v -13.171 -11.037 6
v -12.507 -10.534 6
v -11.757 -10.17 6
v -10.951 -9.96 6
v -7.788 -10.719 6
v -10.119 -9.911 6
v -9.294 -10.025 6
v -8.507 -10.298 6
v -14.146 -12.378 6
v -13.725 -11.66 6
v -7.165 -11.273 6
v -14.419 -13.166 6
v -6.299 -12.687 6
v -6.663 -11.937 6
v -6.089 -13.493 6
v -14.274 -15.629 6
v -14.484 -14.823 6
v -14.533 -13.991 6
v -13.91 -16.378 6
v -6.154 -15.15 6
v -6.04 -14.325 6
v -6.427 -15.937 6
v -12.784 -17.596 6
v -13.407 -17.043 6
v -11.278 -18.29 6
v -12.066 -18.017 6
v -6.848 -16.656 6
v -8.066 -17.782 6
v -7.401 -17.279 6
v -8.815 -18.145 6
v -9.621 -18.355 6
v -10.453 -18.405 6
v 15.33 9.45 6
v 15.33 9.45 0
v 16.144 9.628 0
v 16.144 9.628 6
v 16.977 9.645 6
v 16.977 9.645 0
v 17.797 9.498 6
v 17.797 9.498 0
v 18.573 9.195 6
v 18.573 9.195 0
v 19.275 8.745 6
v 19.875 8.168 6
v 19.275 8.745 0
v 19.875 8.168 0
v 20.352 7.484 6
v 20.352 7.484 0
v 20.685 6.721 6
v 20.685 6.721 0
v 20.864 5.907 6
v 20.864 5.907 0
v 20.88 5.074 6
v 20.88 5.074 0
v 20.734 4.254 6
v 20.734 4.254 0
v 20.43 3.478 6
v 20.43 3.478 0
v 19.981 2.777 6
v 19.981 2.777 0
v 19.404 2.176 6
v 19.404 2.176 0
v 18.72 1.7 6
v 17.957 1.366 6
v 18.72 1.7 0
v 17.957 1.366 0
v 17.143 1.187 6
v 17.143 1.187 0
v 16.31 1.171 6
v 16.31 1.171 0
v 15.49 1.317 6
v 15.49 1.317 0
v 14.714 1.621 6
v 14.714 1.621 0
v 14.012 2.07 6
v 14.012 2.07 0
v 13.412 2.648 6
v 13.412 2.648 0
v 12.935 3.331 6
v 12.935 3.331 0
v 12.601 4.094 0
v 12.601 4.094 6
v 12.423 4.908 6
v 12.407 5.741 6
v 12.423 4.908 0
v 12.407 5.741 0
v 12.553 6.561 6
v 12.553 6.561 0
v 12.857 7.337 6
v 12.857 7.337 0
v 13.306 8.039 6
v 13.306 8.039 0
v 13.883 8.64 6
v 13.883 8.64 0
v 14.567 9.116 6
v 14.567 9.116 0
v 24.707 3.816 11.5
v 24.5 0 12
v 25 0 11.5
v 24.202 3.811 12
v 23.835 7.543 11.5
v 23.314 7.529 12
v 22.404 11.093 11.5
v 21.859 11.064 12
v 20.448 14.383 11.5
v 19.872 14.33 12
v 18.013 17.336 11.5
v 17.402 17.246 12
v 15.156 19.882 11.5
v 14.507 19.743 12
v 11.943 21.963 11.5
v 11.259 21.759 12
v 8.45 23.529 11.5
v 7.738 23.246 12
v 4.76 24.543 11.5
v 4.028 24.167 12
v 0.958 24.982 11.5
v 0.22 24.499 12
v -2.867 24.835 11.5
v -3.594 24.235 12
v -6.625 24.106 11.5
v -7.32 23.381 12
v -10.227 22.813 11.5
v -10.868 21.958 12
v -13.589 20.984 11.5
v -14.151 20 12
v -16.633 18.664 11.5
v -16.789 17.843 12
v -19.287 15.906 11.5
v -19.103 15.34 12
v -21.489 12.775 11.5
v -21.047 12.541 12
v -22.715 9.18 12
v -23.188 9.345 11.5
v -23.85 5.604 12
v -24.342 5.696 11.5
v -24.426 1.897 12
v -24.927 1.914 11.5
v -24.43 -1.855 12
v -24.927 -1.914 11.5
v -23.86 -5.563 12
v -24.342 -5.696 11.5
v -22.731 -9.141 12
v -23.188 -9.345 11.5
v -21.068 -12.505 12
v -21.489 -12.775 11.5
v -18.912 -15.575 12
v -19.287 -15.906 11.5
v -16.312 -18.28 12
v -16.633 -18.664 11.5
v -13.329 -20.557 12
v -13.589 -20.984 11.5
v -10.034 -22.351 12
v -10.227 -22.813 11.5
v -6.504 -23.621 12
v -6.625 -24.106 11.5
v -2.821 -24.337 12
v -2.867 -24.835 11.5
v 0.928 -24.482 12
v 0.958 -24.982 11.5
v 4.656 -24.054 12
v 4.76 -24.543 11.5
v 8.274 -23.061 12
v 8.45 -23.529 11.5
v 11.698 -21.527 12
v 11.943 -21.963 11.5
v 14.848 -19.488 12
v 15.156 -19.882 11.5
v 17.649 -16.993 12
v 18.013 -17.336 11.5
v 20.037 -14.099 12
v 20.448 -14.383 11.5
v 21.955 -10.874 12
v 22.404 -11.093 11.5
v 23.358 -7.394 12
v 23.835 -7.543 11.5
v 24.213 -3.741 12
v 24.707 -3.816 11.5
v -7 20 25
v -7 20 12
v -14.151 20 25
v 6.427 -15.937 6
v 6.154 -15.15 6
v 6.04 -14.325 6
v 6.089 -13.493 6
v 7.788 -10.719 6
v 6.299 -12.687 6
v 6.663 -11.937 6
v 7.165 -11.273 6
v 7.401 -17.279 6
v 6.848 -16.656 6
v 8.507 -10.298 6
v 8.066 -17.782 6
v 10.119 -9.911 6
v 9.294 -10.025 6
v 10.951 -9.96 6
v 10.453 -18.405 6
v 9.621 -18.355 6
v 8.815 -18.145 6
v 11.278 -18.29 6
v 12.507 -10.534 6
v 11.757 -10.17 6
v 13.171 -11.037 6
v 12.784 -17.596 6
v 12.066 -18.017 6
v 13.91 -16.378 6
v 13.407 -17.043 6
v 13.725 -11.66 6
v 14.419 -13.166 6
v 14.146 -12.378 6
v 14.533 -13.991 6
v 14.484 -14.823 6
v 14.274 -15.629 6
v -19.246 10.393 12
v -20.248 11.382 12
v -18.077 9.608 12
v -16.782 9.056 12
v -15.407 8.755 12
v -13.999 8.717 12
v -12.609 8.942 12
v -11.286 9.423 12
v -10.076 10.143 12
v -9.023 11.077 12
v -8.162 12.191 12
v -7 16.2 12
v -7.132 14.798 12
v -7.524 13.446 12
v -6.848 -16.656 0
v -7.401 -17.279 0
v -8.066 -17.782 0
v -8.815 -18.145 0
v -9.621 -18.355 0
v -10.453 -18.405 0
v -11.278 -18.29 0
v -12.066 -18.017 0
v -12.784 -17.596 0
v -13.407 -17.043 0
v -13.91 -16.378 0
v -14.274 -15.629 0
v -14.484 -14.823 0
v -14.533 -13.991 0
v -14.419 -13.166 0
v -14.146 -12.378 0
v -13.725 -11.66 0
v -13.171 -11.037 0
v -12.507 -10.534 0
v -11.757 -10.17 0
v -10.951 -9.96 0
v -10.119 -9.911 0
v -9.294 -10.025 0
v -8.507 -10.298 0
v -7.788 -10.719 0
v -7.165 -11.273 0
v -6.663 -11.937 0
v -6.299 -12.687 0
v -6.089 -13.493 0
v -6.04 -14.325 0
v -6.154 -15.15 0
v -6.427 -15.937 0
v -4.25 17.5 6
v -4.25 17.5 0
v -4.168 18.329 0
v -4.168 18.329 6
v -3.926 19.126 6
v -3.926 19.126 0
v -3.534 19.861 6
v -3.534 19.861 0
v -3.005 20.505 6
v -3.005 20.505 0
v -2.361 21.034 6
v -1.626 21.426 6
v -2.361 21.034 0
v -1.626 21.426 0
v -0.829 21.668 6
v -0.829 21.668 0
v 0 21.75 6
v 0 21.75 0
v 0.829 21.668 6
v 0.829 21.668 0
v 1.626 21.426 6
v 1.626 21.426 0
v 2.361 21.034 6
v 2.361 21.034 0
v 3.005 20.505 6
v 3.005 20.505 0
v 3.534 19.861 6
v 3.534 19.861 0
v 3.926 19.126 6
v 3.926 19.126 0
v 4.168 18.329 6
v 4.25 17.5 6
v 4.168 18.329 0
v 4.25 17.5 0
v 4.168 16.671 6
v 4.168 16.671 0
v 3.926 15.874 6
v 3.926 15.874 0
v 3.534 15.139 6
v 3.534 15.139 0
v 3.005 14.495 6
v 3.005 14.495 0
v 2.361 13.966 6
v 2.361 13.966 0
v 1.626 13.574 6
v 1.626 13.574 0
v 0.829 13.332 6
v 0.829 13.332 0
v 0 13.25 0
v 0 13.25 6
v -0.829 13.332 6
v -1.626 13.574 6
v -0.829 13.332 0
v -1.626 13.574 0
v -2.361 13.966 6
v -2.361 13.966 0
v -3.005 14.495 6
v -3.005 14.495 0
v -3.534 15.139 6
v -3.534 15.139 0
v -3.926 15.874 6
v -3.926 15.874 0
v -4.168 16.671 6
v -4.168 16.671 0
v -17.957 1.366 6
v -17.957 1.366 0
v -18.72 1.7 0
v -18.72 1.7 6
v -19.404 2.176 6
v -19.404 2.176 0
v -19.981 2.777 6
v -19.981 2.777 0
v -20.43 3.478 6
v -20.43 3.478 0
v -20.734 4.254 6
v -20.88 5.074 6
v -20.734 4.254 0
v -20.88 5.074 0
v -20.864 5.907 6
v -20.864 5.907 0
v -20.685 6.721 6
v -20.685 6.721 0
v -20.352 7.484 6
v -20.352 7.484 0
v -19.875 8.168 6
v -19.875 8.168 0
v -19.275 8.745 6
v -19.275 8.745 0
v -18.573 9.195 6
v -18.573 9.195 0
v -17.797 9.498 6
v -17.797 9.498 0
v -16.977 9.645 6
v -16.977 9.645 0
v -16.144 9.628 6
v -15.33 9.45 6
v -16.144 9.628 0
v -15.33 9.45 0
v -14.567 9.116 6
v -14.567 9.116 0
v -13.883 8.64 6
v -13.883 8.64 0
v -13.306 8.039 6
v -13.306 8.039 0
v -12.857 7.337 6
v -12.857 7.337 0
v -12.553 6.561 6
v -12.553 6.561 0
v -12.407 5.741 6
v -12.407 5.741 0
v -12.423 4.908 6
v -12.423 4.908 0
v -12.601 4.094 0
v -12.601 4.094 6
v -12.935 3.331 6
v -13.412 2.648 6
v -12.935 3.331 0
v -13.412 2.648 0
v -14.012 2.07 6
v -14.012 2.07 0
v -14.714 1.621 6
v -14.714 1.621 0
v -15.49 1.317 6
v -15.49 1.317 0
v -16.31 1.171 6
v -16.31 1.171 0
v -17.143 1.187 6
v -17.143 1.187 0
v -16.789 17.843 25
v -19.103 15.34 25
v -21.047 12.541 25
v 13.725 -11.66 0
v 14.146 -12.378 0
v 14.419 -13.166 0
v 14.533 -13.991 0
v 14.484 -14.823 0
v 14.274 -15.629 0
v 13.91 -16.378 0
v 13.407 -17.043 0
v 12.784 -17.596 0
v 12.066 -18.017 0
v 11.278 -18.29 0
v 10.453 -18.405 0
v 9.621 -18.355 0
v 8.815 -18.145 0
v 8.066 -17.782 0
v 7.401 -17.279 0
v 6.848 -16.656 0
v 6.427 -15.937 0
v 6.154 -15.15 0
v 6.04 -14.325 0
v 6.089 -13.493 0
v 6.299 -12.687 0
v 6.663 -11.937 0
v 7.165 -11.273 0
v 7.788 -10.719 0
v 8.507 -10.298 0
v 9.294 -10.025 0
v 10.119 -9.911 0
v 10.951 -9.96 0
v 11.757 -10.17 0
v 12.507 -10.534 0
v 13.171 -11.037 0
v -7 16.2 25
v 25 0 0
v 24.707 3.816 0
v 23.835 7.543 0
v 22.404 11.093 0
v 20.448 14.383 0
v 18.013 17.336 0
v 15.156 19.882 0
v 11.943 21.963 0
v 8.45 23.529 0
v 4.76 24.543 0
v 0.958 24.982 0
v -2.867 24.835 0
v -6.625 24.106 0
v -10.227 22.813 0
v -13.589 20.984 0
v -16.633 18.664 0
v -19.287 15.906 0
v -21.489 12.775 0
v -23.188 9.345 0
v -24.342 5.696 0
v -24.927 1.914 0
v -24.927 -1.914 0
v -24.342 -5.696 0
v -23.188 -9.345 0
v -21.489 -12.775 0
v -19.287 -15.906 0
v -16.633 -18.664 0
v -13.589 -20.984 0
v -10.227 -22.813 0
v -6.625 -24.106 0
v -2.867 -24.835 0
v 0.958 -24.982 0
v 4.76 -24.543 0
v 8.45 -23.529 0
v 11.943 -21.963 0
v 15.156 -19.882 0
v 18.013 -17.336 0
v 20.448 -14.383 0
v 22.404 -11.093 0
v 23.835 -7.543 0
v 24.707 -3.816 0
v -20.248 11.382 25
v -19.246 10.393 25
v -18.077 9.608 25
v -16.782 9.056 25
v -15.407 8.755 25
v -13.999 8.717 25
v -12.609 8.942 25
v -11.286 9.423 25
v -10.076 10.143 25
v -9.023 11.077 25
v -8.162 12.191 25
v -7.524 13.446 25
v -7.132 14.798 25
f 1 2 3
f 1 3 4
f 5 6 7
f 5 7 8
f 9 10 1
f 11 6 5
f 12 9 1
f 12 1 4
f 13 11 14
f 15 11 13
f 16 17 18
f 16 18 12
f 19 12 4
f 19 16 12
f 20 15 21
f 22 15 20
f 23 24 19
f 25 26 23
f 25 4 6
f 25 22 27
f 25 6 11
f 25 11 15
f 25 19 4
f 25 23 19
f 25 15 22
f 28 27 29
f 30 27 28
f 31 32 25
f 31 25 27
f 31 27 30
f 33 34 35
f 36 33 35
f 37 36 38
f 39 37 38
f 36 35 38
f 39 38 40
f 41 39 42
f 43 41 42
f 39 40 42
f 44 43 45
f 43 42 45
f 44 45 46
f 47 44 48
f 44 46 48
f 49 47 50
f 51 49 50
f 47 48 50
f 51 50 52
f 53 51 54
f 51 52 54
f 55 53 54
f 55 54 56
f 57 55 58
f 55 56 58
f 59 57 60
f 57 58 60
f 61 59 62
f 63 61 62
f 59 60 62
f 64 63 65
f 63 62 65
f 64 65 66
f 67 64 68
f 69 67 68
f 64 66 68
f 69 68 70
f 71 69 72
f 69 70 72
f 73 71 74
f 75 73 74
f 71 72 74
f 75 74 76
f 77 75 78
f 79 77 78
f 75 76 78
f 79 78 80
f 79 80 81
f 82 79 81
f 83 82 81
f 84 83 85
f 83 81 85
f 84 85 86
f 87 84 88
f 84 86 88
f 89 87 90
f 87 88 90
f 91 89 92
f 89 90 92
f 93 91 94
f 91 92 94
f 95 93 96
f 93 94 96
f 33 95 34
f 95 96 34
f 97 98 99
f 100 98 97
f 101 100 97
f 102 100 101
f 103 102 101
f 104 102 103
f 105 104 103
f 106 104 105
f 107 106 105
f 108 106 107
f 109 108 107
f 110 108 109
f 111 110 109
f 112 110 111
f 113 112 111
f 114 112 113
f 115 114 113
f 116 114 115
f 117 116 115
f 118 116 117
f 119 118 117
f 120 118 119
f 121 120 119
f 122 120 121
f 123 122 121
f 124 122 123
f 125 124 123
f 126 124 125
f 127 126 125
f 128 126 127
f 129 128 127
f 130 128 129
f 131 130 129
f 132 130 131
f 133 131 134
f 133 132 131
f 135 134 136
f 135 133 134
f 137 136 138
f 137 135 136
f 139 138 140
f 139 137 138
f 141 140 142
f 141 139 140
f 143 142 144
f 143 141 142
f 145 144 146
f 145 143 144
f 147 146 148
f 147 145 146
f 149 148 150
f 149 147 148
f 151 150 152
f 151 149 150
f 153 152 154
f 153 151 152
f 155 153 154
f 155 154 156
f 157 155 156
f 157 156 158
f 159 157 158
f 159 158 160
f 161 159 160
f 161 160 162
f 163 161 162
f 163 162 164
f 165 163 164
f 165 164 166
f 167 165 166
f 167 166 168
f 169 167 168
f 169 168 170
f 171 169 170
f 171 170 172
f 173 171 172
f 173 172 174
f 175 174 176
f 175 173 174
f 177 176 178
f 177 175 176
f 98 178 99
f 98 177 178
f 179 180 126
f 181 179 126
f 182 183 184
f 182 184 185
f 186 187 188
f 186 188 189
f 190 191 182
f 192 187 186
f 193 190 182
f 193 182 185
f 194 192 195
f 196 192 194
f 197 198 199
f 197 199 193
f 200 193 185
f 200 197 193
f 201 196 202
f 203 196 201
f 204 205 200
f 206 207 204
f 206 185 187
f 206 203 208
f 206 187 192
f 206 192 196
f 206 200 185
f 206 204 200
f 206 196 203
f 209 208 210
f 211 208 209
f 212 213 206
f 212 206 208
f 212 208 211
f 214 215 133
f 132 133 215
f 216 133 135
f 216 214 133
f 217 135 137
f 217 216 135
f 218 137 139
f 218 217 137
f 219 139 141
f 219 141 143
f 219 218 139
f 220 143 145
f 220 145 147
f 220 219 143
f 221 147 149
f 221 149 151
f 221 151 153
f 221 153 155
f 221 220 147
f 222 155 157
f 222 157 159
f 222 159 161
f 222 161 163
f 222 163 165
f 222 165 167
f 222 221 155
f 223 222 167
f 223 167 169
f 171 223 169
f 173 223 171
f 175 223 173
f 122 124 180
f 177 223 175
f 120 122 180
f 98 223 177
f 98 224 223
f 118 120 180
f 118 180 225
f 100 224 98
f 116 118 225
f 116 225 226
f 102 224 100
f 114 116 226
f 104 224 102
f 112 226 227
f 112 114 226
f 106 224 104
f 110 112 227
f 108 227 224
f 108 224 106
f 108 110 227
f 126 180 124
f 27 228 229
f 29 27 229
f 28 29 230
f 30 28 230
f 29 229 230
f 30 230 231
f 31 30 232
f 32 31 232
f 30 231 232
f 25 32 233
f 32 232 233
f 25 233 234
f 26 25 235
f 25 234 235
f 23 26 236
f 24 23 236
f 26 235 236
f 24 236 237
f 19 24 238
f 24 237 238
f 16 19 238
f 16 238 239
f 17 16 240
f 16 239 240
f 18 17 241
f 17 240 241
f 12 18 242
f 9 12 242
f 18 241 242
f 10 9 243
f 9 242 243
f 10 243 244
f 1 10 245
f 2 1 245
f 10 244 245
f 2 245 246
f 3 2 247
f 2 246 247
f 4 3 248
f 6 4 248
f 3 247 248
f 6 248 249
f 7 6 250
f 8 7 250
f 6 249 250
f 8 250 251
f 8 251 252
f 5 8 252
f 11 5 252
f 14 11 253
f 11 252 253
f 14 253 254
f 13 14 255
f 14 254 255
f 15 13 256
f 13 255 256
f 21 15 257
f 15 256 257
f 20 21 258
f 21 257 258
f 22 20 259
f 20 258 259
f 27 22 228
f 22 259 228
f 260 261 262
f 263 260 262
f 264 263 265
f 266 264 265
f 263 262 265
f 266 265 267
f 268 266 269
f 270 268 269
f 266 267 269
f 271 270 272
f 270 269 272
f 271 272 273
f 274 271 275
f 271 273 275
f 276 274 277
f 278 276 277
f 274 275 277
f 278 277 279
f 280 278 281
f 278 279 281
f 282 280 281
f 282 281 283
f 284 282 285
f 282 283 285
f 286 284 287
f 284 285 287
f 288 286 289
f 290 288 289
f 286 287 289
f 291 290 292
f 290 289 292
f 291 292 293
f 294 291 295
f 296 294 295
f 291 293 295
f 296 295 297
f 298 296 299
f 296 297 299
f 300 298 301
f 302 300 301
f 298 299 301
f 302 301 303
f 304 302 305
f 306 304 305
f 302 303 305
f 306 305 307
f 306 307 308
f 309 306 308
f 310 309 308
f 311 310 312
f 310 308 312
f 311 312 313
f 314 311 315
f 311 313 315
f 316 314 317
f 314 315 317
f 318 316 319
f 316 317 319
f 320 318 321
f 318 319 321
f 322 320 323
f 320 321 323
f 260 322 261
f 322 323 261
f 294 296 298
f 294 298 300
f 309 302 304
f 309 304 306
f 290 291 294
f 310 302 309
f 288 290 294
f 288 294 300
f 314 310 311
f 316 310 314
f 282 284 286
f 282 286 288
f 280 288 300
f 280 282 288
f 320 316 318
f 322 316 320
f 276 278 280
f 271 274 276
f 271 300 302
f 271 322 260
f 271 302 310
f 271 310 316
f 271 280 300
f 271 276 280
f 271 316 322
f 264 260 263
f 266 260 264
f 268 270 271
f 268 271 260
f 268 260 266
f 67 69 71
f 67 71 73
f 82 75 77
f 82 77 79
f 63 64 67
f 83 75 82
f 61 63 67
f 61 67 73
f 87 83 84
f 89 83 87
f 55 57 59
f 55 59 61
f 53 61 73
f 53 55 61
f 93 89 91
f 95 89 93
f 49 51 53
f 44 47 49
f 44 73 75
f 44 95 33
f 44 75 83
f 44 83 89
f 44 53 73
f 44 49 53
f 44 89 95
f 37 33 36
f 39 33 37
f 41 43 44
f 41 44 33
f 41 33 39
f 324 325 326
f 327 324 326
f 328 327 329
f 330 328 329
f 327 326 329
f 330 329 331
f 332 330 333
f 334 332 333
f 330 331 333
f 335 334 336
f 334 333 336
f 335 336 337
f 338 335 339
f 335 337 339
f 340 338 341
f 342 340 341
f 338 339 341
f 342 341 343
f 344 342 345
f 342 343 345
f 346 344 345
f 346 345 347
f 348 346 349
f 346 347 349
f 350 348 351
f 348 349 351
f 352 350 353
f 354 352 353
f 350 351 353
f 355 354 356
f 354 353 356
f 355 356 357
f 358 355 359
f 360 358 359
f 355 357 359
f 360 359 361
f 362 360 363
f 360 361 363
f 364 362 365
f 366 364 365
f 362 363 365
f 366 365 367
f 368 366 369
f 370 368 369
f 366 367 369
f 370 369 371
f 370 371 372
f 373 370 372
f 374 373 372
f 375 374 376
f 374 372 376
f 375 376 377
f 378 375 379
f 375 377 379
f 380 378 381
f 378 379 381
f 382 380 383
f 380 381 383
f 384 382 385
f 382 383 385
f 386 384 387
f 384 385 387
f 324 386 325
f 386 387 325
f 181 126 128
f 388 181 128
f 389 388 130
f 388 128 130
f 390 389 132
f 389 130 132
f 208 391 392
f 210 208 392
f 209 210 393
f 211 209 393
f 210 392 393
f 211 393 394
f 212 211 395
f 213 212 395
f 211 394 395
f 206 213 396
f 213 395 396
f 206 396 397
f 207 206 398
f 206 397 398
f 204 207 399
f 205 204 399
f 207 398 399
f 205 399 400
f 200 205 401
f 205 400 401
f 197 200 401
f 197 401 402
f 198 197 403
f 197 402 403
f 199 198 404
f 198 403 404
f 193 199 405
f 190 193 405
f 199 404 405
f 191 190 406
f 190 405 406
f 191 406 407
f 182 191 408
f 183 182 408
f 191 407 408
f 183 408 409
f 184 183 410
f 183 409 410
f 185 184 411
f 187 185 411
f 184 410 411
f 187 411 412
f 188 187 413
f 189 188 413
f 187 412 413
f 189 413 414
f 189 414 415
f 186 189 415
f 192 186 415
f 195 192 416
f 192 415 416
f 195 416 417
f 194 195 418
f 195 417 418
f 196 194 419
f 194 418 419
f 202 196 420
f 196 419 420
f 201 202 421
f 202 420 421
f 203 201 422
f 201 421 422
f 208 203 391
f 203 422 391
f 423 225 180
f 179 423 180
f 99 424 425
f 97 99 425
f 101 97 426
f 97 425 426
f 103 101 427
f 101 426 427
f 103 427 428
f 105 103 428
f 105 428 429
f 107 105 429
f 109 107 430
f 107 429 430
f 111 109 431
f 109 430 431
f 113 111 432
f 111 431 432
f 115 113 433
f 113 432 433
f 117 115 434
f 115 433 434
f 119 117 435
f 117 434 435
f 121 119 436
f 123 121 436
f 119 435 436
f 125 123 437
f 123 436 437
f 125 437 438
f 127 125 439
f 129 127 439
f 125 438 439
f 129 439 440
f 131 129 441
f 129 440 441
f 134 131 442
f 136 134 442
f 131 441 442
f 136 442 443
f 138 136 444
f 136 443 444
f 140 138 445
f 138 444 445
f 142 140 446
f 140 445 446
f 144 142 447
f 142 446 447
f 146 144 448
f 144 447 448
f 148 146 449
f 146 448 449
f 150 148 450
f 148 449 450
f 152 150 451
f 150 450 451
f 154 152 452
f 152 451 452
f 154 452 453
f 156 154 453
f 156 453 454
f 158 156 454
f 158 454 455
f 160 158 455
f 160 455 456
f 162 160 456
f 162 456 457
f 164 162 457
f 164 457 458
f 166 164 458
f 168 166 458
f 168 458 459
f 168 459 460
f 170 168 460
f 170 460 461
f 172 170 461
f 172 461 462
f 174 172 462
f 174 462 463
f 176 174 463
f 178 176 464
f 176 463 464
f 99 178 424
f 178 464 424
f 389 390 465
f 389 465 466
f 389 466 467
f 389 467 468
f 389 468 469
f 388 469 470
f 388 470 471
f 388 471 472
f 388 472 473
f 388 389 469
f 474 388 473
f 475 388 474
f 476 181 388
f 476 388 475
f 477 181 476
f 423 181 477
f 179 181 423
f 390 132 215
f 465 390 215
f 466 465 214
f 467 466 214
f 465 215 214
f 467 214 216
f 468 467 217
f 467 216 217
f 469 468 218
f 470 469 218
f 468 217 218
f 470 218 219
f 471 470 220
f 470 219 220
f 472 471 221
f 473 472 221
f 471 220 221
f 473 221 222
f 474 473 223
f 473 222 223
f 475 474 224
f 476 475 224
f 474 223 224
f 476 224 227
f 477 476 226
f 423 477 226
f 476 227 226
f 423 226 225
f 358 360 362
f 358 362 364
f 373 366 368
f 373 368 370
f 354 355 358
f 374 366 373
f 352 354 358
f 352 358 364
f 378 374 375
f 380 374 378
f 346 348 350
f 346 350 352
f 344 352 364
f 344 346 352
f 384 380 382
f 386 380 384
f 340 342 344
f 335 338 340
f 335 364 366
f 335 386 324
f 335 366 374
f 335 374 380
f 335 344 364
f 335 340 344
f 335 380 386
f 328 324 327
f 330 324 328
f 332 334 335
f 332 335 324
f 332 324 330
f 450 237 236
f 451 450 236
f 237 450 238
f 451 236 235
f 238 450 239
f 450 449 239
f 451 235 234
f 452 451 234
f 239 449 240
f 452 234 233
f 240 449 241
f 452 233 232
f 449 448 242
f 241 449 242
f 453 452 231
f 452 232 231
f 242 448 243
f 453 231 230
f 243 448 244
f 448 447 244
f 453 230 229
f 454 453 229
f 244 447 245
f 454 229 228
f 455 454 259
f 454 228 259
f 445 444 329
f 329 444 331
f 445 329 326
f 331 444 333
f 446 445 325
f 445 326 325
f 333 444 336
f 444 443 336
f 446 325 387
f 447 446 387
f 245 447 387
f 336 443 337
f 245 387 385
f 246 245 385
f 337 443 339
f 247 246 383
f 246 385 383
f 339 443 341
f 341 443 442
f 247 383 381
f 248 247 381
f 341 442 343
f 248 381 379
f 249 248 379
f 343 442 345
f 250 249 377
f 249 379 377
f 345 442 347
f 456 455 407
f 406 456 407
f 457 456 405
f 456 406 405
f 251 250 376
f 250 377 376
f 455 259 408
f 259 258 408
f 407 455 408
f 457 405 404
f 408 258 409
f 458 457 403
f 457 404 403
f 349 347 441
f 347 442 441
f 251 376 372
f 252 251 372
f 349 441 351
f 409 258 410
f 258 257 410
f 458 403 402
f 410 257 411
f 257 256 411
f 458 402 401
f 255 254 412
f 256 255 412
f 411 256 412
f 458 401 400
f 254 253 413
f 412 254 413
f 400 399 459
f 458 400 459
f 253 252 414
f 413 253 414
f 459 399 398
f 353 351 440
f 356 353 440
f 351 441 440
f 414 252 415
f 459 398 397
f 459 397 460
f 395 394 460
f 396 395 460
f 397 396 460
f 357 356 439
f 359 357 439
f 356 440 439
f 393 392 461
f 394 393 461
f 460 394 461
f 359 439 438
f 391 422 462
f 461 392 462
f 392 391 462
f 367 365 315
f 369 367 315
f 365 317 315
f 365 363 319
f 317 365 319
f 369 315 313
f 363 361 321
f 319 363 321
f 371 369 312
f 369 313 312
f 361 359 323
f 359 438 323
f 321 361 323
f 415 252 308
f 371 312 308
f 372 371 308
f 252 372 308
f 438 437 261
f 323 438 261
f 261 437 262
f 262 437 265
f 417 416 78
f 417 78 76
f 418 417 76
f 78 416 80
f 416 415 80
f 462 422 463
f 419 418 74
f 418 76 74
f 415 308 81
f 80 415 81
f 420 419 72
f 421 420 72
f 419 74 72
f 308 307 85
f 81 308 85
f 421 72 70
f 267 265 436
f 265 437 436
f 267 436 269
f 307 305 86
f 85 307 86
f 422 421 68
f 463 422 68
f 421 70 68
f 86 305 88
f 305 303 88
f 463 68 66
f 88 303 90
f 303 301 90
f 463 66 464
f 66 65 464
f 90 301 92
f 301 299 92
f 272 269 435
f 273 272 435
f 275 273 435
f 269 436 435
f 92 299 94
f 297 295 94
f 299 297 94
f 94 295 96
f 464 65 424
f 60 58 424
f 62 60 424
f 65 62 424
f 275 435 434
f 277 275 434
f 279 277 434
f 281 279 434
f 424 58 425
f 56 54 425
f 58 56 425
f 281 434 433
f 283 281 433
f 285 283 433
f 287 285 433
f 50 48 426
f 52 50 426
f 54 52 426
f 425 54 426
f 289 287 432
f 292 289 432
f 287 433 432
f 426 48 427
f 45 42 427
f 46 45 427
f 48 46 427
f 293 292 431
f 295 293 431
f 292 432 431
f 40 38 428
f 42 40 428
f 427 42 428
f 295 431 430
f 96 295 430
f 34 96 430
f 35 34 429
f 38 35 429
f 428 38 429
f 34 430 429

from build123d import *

# Parameters (mm, degrees)
SKETCH1_R           = 25
BOSS_EXTRUDE1_DEPTH = 12
CHAMFER1_SIZE       = 0.5
BOSS_EXTRUDE2_DEPTH = 13
SKETCH4_R           = 4.25
CUT_EXTRUDE1_DEPTH  = 6
CIRPATTERN1_COUNT   = 5


# Read off the part's stored shape, not the designer's step: Boss-Extrude2
with BuildPart() as part:
    # Sketch1 → Boss-Extrude1 (new body)
    with BuildSketch(Plane.XY):
        Circle(SKETCH1_R)
    extrude(amount=BOSS_EXTRUDE1_DEPTH)

    # Chamfer1
    chamfer1_edges = [part.edges().sort_by_distance(p)[0] for p in [
        (-25, 0, 12),
    ]]
    chamfer(chamfer1_edges, length=CHAMFER1_SIZE)

    # Boss-Extrude2 outline → Boss-Extrude2 (add)
    with BuildSketch(Plane.XY.offset(12)):
        with BuildLine():
            ThreePointArc((-21.046908053, 12.541039089), (-12.609472348, 8.942183166), (-7, 16.2))
            Line((-7, 16.2), (-7, 20))
            Line((-7, 20), (-14.150971698, 20))
            ThreePointArc((-14.150971698, 20), (-17.989766791, 16.631845682), (-21.046908053, 12.541039089))
        make_face()
    extrude(amount=BOSS_EXTRUDE2_DEPTH)

    # Sketch4 → Cut-Extrude1 (cut)
    with BuildSketch(Plane(origin=(0, 0, 0), x_dir=(-1, 0, 0), z_dir=(0, 0, -1))):
        with Locations((0, 17.5)):
            Circle(SKETCH4_R)
    cut_extrude1 = extrude(amount=-CUT_EXTRUDE1_DEPTH, mode=Mode.SUBTRACT)

    # CirPattern1: Cut-Extrude1 ×5 about axis
    cirpattern1_axis = Axis((0, 0, 0), (0, 0, 1))
    for i in range(1, CIRPATTERN1_COUNT):
        add(cut_extrude1.rotate(cirpattern1_axis, i * 360 / CIRPATTERN1_COUNT), mode=Mode.SUBTRACT)


solid = part.part
